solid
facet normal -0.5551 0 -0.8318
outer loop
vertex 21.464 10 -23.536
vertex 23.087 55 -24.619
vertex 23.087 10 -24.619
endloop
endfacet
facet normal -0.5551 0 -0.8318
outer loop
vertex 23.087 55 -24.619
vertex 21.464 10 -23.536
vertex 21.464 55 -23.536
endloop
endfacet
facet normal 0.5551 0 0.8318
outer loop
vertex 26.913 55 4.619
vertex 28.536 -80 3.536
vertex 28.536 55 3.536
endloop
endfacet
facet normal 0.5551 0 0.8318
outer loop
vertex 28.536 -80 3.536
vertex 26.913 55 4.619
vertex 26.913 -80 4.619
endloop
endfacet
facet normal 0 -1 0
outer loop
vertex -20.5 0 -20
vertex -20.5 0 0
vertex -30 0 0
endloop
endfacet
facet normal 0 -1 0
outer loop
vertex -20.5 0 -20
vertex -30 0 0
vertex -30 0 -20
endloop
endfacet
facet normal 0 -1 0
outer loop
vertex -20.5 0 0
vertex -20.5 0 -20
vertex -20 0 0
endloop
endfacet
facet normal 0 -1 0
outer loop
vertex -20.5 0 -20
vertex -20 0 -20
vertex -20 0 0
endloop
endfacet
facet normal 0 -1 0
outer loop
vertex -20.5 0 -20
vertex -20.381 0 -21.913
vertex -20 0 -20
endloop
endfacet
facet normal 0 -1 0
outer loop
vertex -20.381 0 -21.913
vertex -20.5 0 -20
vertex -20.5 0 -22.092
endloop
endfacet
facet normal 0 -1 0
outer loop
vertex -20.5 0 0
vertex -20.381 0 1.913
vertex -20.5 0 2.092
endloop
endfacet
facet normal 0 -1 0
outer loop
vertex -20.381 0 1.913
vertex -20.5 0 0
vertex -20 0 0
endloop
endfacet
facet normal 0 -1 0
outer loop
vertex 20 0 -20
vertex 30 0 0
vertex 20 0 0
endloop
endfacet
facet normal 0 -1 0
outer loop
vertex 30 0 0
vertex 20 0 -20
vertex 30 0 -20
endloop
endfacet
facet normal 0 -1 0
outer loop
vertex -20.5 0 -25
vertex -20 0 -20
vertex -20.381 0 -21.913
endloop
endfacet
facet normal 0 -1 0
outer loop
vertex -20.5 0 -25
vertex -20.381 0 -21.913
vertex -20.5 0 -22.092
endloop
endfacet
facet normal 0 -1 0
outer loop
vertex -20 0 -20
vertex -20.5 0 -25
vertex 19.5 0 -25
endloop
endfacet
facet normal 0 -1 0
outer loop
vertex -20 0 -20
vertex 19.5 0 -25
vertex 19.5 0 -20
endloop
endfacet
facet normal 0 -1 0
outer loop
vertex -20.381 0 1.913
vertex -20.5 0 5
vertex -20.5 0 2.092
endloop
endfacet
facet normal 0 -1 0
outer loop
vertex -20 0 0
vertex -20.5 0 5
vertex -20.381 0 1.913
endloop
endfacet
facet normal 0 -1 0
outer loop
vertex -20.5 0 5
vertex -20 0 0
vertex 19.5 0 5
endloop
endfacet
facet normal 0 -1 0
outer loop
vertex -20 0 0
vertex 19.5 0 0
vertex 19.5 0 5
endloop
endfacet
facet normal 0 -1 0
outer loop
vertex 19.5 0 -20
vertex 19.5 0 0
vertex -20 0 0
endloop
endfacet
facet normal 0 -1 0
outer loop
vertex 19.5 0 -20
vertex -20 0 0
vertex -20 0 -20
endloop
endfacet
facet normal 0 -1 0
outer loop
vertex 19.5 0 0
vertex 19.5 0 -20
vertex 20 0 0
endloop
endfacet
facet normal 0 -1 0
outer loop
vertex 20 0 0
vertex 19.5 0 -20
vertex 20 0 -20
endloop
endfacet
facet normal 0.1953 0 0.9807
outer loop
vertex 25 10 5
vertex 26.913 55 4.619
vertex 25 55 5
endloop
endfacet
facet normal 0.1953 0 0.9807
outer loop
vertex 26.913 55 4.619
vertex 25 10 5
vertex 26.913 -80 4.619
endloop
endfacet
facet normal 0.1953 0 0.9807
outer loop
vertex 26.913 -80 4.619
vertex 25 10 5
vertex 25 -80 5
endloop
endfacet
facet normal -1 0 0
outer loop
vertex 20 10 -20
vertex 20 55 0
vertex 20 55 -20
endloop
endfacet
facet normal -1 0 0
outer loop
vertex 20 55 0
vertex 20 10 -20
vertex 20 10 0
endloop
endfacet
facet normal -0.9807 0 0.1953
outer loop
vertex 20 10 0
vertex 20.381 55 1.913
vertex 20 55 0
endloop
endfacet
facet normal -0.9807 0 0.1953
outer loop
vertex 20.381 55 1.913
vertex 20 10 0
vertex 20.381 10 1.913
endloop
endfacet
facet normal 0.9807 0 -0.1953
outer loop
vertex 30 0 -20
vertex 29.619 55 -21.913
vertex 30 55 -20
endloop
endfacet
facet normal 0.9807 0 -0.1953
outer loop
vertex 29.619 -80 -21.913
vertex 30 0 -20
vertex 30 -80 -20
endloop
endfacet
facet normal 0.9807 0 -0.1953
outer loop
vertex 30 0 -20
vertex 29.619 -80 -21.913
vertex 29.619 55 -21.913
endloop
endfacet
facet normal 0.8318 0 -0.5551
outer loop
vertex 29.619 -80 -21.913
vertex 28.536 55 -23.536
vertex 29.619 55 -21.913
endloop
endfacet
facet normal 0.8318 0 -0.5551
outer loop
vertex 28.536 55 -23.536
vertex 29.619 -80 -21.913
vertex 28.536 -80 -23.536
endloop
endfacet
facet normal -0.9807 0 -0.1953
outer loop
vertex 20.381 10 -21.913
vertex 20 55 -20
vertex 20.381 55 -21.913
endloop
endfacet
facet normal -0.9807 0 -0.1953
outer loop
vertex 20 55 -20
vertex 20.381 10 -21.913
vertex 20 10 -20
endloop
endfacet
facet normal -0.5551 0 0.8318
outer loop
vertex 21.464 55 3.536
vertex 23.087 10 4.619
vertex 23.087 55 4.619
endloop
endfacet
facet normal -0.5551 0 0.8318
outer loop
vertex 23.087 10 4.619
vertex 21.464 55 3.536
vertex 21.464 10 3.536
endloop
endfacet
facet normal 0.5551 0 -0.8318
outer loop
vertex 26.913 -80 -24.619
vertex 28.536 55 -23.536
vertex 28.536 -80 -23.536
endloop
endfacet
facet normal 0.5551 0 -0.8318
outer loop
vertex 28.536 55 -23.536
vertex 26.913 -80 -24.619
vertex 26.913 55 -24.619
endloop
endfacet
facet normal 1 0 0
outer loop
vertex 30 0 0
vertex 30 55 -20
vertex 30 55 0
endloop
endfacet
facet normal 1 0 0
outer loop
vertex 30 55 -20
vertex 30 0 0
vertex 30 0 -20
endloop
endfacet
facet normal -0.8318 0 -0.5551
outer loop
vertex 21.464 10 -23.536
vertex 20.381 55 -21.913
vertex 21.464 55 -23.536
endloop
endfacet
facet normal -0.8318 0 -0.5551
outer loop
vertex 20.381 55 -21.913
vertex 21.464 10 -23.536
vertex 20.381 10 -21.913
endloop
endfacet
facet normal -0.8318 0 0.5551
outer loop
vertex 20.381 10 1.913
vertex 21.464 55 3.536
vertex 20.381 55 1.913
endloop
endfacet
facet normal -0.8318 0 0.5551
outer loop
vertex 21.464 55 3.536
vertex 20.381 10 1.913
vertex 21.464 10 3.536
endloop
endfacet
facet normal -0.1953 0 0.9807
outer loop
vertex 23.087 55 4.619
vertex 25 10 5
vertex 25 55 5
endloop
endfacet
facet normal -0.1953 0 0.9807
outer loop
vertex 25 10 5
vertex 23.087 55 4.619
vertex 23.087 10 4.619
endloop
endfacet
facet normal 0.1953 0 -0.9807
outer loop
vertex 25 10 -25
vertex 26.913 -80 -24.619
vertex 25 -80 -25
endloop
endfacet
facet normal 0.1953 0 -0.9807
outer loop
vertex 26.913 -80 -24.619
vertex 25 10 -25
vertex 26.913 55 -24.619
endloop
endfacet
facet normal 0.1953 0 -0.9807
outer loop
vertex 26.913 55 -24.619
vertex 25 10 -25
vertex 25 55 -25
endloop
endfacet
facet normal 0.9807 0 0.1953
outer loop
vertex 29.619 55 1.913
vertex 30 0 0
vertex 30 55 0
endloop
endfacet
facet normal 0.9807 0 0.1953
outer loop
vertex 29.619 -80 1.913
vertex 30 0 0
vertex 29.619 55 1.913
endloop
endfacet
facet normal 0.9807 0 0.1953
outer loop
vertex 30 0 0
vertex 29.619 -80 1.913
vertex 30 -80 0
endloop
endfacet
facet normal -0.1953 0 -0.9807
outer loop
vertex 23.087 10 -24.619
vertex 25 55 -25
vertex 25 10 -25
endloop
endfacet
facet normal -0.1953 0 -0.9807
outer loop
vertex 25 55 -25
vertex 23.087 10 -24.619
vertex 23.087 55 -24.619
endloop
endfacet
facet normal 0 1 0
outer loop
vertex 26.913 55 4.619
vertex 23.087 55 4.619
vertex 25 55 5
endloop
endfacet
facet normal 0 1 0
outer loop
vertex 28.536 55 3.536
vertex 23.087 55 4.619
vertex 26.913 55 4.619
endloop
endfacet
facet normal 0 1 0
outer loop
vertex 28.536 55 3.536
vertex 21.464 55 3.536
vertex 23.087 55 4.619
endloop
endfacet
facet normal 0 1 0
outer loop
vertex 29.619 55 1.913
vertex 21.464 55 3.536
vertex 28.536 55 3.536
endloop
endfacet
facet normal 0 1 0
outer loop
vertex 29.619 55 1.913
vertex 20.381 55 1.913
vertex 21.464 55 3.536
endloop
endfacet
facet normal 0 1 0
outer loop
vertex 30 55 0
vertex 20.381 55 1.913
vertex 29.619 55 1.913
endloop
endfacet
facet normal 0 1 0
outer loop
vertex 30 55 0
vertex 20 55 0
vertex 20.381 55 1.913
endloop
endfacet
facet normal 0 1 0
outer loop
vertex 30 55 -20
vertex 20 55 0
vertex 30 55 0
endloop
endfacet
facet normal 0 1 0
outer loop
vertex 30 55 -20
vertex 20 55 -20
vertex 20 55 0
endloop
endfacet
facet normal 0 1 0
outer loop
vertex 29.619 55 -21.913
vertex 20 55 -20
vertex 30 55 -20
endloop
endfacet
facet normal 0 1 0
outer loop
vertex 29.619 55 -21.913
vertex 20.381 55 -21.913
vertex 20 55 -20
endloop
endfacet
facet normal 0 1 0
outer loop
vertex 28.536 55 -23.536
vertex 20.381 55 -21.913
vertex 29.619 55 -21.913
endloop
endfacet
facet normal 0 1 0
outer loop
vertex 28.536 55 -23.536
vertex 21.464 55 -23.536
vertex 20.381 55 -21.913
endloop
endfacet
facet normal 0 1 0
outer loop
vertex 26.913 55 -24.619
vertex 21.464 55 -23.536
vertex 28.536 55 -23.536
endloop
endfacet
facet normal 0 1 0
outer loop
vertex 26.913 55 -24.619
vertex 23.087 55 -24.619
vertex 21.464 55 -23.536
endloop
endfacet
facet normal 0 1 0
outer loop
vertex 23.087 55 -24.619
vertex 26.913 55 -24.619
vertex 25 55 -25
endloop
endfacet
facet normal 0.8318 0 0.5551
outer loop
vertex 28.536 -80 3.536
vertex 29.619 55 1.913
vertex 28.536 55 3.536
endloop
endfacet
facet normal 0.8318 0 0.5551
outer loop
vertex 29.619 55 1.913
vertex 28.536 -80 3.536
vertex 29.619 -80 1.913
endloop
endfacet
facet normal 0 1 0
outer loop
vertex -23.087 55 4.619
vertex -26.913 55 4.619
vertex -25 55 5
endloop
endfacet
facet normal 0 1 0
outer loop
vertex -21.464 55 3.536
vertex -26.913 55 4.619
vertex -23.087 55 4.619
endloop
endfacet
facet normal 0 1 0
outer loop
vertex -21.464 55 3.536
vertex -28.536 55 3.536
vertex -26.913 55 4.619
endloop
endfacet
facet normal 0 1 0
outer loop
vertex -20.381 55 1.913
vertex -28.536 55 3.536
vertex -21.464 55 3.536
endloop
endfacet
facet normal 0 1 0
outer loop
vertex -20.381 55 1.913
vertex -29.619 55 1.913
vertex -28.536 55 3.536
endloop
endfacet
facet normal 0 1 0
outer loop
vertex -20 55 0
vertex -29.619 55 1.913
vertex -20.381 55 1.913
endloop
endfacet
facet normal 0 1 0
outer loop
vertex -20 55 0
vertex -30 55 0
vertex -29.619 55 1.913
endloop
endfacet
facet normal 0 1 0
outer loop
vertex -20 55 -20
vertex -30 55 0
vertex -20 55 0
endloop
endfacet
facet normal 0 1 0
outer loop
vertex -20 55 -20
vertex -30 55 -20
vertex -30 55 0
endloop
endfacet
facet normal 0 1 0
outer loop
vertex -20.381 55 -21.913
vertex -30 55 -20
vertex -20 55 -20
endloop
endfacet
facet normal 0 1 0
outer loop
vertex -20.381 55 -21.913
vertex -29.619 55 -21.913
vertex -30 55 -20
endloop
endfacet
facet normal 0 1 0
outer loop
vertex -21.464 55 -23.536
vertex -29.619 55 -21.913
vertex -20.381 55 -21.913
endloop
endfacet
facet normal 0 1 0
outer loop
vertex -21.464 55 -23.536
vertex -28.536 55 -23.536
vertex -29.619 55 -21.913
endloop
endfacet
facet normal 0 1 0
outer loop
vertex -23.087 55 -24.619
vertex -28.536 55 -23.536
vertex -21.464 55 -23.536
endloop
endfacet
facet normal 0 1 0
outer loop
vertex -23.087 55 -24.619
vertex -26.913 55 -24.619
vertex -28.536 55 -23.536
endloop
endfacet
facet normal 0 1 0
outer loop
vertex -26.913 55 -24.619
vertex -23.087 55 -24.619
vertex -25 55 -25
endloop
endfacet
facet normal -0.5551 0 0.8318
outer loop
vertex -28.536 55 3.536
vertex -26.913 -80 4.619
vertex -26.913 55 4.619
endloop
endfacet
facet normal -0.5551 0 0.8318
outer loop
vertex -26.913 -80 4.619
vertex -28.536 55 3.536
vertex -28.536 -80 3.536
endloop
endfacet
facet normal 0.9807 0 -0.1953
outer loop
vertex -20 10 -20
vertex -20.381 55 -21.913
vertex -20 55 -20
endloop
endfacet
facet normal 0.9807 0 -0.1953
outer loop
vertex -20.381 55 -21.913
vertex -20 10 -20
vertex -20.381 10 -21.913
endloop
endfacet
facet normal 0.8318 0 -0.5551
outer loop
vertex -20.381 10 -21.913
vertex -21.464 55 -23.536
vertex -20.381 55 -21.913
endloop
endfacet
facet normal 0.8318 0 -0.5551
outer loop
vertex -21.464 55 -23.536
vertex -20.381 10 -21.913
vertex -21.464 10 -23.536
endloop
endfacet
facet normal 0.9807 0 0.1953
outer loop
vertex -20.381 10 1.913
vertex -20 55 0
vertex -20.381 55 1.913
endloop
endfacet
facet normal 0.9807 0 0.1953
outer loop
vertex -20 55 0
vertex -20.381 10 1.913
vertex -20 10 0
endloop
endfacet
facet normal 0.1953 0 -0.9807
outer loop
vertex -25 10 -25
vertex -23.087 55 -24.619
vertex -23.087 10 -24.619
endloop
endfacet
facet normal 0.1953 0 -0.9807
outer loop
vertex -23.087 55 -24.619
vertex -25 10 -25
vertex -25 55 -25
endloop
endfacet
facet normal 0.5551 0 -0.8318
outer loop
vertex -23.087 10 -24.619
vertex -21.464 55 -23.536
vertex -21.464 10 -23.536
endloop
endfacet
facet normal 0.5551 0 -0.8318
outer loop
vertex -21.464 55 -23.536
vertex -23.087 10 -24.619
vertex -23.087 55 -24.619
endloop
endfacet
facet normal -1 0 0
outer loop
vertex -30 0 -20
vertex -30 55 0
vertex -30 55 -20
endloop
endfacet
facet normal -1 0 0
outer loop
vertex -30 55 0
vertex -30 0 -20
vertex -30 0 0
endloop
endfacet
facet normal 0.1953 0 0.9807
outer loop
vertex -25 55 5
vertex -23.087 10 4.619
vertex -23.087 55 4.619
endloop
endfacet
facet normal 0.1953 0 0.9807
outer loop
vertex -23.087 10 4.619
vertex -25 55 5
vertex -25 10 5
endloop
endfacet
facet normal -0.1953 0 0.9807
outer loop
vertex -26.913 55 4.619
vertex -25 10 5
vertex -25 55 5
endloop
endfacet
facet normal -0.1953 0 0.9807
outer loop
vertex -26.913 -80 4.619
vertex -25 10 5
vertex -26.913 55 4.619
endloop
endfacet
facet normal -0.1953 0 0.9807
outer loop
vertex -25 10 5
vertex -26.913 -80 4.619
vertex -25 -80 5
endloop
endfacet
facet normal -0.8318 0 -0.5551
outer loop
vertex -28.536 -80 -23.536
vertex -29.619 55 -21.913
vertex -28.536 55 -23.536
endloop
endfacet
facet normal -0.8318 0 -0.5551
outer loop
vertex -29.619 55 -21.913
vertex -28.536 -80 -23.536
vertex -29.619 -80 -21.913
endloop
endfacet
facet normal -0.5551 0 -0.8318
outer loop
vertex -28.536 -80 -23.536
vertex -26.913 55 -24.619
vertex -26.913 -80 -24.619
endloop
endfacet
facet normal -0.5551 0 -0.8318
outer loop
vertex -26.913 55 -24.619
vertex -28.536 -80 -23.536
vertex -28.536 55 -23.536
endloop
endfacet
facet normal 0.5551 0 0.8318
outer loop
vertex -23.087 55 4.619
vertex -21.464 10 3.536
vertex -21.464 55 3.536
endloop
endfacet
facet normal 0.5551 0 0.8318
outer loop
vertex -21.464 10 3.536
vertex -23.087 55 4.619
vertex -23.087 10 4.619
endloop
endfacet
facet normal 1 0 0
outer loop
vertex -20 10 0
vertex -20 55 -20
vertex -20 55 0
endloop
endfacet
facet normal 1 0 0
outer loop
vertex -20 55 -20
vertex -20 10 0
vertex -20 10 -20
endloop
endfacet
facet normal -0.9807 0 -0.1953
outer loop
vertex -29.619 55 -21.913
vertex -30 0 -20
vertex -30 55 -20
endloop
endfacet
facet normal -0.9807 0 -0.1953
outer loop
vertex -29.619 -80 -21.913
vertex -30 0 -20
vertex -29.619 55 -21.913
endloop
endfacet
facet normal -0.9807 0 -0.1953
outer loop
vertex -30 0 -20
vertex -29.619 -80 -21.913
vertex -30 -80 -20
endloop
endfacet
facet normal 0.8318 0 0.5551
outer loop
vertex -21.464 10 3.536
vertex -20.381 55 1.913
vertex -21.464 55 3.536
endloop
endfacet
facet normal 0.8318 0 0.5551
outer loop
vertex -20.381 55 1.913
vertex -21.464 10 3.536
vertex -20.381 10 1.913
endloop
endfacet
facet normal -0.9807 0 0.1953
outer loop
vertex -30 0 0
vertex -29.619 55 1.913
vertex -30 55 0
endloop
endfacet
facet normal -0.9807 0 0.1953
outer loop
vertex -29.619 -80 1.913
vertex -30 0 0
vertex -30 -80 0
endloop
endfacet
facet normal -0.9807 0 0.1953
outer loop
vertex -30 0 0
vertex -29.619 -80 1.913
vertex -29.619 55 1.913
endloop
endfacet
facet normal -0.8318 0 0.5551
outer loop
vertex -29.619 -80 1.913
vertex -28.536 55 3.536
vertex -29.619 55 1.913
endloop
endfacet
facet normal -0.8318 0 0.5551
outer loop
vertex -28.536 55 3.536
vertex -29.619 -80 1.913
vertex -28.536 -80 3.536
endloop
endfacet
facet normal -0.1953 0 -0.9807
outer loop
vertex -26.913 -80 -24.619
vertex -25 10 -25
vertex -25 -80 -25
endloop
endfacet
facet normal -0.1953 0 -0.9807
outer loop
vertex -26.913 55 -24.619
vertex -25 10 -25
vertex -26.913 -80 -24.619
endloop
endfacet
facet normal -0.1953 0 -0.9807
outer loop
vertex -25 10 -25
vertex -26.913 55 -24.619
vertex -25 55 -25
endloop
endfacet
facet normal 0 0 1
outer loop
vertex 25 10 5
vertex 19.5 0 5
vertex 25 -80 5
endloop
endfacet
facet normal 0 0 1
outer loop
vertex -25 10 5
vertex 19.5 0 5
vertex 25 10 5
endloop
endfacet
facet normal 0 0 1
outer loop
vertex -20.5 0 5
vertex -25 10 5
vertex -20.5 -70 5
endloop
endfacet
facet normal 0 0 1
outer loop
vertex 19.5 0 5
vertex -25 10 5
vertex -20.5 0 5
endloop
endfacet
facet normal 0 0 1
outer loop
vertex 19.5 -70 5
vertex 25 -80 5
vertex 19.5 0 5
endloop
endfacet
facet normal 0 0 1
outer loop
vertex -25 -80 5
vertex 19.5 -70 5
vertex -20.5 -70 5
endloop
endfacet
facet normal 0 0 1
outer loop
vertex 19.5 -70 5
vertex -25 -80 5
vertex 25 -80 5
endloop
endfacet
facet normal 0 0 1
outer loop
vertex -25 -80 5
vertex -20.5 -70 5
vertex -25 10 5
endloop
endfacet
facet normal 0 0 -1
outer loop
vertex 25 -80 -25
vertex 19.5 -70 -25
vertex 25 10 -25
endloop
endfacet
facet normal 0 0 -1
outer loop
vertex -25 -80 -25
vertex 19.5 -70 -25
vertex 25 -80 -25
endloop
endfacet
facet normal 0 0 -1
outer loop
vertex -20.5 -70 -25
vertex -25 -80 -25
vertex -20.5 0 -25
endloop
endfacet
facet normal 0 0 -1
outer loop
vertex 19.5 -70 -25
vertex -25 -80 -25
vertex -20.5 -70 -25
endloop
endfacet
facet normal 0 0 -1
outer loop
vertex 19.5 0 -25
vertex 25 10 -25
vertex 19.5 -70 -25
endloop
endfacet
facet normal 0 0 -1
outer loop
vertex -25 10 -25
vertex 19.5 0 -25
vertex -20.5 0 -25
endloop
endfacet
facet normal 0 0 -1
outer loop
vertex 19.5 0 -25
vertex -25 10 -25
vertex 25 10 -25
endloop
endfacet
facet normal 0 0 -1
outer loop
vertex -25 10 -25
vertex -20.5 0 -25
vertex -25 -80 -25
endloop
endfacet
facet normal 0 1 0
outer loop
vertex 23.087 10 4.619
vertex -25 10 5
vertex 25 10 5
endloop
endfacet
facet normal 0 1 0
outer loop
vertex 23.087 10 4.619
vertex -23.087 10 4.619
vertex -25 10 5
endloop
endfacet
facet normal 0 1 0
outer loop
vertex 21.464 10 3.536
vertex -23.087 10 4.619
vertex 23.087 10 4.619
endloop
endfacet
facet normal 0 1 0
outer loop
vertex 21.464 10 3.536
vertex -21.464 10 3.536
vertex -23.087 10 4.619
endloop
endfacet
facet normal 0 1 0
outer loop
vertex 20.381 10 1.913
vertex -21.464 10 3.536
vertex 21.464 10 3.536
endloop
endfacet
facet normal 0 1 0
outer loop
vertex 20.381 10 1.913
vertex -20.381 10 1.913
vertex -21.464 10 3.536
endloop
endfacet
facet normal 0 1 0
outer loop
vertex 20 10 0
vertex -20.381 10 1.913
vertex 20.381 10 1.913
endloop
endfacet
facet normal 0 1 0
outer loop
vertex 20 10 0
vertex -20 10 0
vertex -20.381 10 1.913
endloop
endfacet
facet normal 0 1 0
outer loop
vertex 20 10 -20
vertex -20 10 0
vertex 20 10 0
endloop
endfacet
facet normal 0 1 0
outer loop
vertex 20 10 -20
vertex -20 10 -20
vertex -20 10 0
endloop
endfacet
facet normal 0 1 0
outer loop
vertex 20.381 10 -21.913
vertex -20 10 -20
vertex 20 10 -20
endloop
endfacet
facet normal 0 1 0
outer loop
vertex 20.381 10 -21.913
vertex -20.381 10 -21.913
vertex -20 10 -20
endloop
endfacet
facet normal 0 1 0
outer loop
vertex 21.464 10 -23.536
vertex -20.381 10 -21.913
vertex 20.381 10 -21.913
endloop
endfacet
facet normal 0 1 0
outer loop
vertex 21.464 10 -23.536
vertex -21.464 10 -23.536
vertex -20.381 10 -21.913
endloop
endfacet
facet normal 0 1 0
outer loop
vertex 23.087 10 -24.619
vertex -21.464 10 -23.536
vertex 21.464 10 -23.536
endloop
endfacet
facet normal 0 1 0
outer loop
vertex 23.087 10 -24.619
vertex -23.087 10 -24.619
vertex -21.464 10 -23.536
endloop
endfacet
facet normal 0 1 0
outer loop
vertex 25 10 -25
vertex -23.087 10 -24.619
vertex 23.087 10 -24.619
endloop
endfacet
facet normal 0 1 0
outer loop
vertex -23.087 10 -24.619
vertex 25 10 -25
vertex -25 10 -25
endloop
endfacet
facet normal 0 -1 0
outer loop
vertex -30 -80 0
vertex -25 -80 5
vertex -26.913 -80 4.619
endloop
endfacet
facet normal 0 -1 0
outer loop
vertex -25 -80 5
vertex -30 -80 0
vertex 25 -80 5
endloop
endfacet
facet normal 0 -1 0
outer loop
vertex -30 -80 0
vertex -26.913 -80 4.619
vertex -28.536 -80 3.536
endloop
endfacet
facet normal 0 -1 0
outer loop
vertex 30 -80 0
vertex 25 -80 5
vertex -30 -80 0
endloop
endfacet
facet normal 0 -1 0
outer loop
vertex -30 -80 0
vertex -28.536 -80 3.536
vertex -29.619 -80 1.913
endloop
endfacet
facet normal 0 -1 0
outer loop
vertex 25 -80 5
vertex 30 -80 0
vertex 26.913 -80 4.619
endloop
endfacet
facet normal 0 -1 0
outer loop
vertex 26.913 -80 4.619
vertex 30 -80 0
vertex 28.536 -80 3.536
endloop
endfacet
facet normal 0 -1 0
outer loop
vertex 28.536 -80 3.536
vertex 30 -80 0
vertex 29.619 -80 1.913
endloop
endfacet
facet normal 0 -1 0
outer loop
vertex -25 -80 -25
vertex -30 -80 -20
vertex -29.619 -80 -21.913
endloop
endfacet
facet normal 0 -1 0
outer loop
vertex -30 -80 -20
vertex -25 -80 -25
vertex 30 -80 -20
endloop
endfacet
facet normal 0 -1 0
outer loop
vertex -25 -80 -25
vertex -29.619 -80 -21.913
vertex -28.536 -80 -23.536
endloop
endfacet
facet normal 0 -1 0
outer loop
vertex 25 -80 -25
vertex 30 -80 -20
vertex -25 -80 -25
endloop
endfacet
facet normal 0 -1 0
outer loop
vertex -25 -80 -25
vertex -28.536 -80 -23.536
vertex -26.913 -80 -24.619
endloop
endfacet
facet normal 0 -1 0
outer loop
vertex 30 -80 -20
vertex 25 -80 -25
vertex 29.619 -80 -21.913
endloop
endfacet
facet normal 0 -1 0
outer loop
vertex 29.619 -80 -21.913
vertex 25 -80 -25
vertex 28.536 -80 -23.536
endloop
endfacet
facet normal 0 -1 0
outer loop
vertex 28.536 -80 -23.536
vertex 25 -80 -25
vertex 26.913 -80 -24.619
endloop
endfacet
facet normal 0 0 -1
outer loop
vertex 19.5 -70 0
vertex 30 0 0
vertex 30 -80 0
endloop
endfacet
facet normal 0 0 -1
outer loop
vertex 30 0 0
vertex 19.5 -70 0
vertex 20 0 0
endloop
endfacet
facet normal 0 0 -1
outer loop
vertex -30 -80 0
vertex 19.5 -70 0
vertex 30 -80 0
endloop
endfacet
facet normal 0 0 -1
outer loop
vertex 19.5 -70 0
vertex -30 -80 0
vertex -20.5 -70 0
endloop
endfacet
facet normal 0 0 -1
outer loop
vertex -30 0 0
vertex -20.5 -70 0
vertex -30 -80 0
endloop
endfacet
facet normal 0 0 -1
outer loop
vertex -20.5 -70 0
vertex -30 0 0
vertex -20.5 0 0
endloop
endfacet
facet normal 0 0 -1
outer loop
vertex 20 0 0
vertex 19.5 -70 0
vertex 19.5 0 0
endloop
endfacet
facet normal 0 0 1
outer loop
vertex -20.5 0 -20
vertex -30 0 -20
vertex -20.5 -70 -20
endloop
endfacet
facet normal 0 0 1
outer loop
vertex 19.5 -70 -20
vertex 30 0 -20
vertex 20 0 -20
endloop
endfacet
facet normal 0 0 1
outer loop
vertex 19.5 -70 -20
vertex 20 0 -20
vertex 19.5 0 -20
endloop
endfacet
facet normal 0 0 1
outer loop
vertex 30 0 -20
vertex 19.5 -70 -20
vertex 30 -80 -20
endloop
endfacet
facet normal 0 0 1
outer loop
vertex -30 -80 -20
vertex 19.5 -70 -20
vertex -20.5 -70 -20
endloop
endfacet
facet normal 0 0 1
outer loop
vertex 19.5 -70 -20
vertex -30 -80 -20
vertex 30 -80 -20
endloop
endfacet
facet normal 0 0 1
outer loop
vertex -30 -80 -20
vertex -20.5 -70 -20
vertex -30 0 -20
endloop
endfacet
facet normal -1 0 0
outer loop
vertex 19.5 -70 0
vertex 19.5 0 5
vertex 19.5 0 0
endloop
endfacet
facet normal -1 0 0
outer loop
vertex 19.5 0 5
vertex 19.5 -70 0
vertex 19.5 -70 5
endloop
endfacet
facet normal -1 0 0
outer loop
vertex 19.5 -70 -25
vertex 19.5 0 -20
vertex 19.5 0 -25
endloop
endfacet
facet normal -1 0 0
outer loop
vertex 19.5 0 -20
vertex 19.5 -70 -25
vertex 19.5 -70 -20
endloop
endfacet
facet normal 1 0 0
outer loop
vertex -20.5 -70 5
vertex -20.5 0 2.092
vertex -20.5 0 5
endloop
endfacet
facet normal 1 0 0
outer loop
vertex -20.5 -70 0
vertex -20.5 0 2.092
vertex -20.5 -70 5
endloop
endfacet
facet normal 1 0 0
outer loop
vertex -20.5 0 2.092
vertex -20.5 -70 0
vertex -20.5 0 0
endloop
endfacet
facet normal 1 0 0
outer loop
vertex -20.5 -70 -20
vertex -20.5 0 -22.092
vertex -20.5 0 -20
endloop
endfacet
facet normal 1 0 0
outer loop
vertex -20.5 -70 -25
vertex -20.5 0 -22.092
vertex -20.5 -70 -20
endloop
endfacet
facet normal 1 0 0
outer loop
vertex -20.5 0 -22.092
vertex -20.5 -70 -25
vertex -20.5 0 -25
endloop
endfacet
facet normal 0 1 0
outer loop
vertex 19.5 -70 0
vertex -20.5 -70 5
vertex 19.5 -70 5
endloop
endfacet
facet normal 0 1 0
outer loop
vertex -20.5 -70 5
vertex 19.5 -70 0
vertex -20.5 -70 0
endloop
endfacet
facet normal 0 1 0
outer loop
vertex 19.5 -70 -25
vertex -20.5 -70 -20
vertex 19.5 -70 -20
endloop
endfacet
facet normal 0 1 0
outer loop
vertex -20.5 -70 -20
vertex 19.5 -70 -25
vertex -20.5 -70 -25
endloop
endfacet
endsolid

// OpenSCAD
x = 40; // ukulele handle width
d = 5; // shell thickness
p = 10; // front plate thickness
a = 10; // ukulele hooks thickness
l = 80; // shelf grippers length
h = 20; // shelf height
b = 45; // ukulele handles length

/*
color("olive") {
  y = 1000;
  z = 230;
  translate([-y/2,-z,-h])
    cube([y,z,h]);
}
*/

module holder_side() {
  translate([x/2+a/2,0,0]) {
    rotate([-90,90,0]) {
      linear_extrude(height=b+p) {
        hull() {
          circle(d=a);
          translate([h+2*d-a,0,0])
            circle(d=a);
        }
      }
    }
  }
}

module holder() {
  holder_side();
  mirror() holder_side();
}

module frame() {
  difference() {
    translate([-x/2-a,-l,-h-d])
      cube([x+2*a,l+p,h+2*d]);
    translate([-(x+2*a+1)/2,-l-1,-h])
      cube([x+2*a+1,l+1,h]);
    translate([-(x+1)/2,-l+a,-h-d-1])
      cube([x,l-a,h+2*d+2]);
  }
}

color("white") {
  holder();
  intersection() {
    s = 2*(d+l)/b;
    frame();
    translate([0,-(d+l),0]) scale([1,s,1]) hull() holder();
  }
}
